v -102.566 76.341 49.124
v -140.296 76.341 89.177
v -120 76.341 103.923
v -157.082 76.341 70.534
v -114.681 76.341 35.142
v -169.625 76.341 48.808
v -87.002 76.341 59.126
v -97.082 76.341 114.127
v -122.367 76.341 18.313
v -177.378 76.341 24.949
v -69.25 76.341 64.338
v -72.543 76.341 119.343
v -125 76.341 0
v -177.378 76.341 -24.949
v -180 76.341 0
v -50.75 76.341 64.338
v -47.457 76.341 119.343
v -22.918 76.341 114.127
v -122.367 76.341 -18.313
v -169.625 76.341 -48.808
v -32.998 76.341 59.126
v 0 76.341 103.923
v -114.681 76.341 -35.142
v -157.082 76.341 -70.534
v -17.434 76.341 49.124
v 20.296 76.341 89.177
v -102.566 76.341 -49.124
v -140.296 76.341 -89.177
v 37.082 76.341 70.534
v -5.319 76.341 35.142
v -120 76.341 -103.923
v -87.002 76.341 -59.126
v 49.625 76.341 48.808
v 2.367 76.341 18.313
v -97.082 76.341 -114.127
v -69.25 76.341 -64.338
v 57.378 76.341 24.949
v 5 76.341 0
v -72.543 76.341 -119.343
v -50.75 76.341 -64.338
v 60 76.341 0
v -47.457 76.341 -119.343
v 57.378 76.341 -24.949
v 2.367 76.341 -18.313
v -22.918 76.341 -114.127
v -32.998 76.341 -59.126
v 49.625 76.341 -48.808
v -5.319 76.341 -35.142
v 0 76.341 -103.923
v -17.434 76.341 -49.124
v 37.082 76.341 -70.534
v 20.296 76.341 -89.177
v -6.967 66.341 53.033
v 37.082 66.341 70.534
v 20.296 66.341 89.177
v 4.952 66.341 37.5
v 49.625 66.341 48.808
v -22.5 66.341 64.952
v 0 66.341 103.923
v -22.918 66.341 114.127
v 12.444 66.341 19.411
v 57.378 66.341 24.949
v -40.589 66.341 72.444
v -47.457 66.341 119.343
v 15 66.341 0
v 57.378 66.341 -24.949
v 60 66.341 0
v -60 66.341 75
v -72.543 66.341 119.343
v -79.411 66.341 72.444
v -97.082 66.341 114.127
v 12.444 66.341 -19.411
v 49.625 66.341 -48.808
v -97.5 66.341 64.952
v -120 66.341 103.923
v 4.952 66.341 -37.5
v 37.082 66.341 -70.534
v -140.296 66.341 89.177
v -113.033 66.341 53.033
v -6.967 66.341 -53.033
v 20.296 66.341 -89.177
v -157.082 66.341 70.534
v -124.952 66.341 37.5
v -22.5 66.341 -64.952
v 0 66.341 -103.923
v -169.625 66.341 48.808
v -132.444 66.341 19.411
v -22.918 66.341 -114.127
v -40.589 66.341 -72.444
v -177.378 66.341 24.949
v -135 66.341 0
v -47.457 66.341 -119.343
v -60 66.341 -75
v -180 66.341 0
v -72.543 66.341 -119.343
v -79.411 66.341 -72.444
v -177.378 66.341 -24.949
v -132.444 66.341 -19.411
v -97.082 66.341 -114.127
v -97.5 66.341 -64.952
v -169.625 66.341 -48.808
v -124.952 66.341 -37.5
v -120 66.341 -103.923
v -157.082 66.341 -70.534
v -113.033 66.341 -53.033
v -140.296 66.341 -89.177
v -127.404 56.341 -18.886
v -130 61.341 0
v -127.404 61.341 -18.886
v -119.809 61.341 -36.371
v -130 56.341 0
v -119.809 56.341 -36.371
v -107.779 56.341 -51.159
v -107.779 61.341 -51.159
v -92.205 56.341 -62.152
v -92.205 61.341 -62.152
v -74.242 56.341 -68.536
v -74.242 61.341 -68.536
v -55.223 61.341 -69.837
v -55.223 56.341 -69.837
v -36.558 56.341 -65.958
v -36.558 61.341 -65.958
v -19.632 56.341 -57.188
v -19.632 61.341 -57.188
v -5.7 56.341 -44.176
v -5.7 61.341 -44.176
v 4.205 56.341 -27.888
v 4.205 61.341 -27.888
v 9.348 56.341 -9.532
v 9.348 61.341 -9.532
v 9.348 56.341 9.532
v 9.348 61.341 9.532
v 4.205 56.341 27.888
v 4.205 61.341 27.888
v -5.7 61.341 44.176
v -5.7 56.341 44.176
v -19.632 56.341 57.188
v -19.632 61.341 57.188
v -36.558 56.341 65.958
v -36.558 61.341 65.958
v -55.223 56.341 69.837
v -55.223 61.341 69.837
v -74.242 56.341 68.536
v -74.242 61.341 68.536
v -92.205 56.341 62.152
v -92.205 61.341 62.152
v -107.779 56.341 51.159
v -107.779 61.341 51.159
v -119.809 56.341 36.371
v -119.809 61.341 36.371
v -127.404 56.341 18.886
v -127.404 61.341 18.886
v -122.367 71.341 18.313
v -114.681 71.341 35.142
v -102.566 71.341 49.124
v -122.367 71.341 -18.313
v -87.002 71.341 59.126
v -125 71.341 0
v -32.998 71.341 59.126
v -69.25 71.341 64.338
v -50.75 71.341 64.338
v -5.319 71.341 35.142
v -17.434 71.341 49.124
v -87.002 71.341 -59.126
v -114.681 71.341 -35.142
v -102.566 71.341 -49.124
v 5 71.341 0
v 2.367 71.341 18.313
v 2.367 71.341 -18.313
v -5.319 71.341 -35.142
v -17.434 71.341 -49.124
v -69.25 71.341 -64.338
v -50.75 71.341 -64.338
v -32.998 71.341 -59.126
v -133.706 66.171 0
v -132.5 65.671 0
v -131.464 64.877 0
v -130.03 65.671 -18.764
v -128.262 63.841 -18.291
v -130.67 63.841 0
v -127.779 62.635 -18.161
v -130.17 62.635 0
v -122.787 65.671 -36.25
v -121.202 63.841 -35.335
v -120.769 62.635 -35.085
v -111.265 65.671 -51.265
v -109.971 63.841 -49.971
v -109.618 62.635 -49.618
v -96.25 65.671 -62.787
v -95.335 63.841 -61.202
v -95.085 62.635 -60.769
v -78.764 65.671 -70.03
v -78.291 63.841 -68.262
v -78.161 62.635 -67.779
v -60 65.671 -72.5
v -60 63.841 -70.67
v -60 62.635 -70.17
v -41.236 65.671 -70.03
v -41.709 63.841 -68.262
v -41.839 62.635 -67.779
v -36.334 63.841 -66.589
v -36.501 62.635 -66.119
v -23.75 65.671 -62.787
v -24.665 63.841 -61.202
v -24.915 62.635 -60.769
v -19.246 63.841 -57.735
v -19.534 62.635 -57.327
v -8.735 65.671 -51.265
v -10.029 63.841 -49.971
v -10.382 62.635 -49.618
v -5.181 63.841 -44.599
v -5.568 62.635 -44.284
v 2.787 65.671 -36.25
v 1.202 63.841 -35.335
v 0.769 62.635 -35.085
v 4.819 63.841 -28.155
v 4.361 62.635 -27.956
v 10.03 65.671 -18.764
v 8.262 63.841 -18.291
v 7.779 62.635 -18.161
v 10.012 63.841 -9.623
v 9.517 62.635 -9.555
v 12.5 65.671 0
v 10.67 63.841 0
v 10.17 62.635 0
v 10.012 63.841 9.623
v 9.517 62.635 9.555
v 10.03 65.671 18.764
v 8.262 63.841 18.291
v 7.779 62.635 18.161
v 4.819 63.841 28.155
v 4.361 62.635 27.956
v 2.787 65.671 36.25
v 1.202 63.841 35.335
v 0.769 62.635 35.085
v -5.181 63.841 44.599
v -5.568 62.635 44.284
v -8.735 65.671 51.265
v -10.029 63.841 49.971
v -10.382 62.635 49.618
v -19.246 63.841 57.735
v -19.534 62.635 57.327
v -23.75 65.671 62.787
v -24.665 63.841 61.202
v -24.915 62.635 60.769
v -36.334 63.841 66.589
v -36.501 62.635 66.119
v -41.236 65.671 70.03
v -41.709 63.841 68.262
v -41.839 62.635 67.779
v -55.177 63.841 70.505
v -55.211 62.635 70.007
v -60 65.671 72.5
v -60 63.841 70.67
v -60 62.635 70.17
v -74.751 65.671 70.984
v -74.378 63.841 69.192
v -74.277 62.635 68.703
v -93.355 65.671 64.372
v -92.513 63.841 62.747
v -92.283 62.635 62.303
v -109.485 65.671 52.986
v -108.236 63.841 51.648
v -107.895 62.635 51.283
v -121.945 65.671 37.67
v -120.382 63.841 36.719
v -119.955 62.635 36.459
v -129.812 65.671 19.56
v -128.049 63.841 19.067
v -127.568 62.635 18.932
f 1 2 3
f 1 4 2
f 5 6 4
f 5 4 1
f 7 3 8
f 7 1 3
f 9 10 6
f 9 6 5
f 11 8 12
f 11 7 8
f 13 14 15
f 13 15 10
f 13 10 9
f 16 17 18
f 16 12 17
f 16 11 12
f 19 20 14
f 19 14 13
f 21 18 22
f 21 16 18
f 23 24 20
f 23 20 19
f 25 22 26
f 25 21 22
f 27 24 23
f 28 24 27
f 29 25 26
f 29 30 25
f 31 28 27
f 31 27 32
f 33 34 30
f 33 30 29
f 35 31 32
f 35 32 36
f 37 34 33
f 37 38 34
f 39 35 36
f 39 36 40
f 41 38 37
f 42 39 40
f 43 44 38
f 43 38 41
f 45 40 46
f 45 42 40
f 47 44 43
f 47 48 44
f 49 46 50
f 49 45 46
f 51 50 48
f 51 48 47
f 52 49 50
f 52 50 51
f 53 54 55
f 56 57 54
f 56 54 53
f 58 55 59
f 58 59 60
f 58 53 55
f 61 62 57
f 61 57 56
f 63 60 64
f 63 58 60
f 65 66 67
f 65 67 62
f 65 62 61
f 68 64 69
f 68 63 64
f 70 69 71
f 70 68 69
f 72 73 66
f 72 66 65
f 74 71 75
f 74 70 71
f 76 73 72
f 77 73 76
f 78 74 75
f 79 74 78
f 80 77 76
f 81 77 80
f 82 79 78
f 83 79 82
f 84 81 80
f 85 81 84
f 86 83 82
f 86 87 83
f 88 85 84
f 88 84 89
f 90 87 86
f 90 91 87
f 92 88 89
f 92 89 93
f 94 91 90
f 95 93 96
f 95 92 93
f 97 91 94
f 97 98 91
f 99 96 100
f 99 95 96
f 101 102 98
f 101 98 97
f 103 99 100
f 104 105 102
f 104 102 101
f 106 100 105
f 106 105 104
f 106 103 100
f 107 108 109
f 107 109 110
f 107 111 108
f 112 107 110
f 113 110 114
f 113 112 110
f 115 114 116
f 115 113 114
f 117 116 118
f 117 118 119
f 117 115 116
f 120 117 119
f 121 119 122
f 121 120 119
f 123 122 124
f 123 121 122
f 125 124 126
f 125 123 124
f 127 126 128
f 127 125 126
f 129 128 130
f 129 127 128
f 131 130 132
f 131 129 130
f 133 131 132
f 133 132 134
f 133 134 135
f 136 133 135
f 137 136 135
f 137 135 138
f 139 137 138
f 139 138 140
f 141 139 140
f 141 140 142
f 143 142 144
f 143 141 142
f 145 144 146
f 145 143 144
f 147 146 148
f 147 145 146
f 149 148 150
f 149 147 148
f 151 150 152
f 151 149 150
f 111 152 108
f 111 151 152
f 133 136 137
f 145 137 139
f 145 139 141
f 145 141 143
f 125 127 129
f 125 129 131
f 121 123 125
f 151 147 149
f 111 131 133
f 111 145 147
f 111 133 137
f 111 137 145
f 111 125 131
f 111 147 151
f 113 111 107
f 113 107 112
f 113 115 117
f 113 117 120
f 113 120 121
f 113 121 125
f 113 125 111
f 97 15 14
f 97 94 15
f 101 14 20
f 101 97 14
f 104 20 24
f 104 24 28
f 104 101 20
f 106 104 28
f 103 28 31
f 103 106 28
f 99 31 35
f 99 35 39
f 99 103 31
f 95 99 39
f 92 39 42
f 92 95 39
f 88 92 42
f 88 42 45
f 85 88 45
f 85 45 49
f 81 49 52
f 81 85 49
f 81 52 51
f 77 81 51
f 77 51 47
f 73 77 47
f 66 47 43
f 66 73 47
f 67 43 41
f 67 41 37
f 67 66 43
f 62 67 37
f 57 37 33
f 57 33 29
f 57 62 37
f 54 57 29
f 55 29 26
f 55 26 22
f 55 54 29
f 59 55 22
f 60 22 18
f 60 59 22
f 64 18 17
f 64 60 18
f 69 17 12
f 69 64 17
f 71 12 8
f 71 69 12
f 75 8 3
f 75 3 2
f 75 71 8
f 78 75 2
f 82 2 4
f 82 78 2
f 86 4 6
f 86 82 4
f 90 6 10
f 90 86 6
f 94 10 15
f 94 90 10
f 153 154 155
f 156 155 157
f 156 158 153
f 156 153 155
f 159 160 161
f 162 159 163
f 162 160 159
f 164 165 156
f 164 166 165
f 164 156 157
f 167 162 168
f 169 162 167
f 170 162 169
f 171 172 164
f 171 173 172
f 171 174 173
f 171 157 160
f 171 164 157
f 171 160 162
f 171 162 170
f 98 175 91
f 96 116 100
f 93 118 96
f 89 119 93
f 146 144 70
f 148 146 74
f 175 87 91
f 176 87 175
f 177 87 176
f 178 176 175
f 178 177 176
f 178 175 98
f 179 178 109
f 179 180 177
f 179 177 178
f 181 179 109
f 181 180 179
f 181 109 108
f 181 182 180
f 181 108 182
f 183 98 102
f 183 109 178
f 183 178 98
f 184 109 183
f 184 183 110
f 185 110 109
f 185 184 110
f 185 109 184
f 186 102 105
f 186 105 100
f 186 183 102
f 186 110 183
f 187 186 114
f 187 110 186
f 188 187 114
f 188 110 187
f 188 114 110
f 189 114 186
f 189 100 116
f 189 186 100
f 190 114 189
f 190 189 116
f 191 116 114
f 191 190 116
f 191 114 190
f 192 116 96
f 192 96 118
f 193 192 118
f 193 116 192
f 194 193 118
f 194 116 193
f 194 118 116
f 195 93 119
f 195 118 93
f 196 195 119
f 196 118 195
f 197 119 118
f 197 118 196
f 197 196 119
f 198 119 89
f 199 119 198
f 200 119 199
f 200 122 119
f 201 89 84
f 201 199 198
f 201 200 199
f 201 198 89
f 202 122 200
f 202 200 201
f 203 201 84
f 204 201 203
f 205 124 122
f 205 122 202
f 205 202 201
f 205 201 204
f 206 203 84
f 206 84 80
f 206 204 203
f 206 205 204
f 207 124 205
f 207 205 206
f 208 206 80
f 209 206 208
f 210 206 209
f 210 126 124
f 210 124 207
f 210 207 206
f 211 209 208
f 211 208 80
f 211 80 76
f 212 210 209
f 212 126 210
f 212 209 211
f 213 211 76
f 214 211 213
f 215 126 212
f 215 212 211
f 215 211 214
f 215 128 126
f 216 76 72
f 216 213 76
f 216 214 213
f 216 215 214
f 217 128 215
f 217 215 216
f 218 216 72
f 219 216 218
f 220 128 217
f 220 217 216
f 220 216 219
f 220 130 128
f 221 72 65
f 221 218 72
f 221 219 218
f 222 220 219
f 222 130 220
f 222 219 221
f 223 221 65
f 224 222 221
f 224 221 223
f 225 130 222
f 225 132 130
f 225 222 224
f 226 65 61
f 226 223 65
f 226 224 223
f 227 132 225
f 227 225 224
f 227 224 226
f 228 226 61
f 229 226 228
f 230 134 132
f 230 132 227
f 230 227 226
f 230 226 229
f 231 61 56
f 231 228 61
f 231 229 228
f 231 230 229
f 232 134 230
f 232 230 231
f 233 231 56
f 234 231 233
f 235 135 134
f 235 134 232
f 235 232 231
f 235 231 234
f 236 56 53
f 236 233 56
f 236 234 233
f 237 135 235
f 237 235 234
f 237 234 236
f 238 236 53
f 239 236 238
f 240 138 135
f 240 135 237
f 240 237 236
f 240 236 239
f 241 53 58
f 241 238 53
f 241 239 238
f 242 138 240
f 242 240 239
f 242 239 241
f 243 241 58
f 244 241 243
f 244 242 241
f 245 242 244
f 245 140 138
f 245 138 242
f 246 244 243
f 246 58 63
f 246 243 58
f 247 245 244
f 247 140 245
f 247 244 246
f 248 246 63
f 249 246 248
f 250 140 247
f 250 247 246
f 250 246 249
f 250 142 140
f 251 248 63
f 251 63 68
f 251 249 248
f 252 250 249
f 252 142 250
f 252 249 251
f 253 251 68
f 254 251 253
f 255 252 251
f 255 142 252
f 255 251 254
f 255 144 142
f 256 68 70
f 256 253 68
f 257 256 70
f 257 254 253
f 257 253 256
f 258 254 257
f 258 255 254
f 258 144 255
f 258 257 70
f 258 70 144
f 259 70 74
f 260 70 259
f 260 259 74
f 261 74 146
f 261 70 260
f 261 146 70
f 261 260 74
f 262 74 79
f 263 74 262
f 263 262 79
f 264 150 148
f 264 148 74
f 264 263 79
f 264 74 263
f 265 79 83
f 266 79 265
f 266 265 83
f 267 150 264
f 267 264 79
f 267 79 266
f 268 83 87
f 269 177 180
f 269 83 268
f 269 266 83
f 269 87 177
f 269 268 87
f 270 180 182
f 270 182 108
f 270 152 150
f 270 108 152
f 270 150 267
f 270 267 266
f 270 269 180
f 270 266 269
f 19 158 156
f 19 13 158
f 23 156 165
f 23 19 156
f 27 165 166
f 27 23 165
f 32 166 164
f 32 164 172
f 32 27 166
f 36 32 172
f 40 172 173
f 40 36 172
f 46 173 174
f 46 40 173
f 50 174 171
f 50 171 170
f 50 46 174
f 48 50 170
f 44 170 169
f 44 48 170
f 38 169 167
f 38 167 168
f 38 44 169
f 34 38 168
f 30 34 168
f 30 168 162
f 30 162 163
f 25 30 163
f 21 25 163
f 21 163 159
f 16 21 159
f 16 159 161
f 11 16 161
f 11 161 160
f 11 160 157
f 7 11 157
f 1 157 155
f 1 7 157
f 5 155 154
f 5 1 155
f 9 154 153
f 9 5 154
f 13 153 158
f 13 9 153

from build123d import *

# Parameters (mm, degrees)
SKETCH1_W = 60
SKETCH1_H = 15


with BuildPart() as part:
    # Эскиз1 → Revolve 449 (revolve)
    with BuildSketch(Plane.XY, mode=Mode.PRIVATE) as revolve_449_sk:
        with BuildLine():
            Line((5, 76.341055046), (60, 76.341055046))
            Line((60, 76.341055046), (60, 66.341055046))
            Line((60, 66.341055046), (15, 66.341055046))
            ThreePointArc((15, 66.341055046), (11.464466094, 64.876588952), (10, 61.341055046))
            Line((10, 61.341055046), (10, 56.341055046))
            Line((10, 56.341055046), (0, 56.341055046))
            Line((0, 56.341055046), (0, 71.341055046))
            Line((0, 71.341055046), (5, 71.341055046))
            Line((5, 71.341055046), (5, 76.341055046))
        make_face()
    revolve(revolve_449_sk.sketch.rotate(Axis((-60, 97.731625762, 0), (0, -1, 0)), 180), axis=Axis((-60, 97.731625762, 0), (0, -1, 0)))

    # Sketch1 → Revolve1 (revolve)
    with BuildSketch(Plane.XY):
        with Locations((-30, 63.841055046)):
            Rectangle(SKETCH1_W, SKETCH1_H)
    revolve(axis=Axis((-60, 66.341055046, 0), (0, 1, 0)))


solid = part.part
